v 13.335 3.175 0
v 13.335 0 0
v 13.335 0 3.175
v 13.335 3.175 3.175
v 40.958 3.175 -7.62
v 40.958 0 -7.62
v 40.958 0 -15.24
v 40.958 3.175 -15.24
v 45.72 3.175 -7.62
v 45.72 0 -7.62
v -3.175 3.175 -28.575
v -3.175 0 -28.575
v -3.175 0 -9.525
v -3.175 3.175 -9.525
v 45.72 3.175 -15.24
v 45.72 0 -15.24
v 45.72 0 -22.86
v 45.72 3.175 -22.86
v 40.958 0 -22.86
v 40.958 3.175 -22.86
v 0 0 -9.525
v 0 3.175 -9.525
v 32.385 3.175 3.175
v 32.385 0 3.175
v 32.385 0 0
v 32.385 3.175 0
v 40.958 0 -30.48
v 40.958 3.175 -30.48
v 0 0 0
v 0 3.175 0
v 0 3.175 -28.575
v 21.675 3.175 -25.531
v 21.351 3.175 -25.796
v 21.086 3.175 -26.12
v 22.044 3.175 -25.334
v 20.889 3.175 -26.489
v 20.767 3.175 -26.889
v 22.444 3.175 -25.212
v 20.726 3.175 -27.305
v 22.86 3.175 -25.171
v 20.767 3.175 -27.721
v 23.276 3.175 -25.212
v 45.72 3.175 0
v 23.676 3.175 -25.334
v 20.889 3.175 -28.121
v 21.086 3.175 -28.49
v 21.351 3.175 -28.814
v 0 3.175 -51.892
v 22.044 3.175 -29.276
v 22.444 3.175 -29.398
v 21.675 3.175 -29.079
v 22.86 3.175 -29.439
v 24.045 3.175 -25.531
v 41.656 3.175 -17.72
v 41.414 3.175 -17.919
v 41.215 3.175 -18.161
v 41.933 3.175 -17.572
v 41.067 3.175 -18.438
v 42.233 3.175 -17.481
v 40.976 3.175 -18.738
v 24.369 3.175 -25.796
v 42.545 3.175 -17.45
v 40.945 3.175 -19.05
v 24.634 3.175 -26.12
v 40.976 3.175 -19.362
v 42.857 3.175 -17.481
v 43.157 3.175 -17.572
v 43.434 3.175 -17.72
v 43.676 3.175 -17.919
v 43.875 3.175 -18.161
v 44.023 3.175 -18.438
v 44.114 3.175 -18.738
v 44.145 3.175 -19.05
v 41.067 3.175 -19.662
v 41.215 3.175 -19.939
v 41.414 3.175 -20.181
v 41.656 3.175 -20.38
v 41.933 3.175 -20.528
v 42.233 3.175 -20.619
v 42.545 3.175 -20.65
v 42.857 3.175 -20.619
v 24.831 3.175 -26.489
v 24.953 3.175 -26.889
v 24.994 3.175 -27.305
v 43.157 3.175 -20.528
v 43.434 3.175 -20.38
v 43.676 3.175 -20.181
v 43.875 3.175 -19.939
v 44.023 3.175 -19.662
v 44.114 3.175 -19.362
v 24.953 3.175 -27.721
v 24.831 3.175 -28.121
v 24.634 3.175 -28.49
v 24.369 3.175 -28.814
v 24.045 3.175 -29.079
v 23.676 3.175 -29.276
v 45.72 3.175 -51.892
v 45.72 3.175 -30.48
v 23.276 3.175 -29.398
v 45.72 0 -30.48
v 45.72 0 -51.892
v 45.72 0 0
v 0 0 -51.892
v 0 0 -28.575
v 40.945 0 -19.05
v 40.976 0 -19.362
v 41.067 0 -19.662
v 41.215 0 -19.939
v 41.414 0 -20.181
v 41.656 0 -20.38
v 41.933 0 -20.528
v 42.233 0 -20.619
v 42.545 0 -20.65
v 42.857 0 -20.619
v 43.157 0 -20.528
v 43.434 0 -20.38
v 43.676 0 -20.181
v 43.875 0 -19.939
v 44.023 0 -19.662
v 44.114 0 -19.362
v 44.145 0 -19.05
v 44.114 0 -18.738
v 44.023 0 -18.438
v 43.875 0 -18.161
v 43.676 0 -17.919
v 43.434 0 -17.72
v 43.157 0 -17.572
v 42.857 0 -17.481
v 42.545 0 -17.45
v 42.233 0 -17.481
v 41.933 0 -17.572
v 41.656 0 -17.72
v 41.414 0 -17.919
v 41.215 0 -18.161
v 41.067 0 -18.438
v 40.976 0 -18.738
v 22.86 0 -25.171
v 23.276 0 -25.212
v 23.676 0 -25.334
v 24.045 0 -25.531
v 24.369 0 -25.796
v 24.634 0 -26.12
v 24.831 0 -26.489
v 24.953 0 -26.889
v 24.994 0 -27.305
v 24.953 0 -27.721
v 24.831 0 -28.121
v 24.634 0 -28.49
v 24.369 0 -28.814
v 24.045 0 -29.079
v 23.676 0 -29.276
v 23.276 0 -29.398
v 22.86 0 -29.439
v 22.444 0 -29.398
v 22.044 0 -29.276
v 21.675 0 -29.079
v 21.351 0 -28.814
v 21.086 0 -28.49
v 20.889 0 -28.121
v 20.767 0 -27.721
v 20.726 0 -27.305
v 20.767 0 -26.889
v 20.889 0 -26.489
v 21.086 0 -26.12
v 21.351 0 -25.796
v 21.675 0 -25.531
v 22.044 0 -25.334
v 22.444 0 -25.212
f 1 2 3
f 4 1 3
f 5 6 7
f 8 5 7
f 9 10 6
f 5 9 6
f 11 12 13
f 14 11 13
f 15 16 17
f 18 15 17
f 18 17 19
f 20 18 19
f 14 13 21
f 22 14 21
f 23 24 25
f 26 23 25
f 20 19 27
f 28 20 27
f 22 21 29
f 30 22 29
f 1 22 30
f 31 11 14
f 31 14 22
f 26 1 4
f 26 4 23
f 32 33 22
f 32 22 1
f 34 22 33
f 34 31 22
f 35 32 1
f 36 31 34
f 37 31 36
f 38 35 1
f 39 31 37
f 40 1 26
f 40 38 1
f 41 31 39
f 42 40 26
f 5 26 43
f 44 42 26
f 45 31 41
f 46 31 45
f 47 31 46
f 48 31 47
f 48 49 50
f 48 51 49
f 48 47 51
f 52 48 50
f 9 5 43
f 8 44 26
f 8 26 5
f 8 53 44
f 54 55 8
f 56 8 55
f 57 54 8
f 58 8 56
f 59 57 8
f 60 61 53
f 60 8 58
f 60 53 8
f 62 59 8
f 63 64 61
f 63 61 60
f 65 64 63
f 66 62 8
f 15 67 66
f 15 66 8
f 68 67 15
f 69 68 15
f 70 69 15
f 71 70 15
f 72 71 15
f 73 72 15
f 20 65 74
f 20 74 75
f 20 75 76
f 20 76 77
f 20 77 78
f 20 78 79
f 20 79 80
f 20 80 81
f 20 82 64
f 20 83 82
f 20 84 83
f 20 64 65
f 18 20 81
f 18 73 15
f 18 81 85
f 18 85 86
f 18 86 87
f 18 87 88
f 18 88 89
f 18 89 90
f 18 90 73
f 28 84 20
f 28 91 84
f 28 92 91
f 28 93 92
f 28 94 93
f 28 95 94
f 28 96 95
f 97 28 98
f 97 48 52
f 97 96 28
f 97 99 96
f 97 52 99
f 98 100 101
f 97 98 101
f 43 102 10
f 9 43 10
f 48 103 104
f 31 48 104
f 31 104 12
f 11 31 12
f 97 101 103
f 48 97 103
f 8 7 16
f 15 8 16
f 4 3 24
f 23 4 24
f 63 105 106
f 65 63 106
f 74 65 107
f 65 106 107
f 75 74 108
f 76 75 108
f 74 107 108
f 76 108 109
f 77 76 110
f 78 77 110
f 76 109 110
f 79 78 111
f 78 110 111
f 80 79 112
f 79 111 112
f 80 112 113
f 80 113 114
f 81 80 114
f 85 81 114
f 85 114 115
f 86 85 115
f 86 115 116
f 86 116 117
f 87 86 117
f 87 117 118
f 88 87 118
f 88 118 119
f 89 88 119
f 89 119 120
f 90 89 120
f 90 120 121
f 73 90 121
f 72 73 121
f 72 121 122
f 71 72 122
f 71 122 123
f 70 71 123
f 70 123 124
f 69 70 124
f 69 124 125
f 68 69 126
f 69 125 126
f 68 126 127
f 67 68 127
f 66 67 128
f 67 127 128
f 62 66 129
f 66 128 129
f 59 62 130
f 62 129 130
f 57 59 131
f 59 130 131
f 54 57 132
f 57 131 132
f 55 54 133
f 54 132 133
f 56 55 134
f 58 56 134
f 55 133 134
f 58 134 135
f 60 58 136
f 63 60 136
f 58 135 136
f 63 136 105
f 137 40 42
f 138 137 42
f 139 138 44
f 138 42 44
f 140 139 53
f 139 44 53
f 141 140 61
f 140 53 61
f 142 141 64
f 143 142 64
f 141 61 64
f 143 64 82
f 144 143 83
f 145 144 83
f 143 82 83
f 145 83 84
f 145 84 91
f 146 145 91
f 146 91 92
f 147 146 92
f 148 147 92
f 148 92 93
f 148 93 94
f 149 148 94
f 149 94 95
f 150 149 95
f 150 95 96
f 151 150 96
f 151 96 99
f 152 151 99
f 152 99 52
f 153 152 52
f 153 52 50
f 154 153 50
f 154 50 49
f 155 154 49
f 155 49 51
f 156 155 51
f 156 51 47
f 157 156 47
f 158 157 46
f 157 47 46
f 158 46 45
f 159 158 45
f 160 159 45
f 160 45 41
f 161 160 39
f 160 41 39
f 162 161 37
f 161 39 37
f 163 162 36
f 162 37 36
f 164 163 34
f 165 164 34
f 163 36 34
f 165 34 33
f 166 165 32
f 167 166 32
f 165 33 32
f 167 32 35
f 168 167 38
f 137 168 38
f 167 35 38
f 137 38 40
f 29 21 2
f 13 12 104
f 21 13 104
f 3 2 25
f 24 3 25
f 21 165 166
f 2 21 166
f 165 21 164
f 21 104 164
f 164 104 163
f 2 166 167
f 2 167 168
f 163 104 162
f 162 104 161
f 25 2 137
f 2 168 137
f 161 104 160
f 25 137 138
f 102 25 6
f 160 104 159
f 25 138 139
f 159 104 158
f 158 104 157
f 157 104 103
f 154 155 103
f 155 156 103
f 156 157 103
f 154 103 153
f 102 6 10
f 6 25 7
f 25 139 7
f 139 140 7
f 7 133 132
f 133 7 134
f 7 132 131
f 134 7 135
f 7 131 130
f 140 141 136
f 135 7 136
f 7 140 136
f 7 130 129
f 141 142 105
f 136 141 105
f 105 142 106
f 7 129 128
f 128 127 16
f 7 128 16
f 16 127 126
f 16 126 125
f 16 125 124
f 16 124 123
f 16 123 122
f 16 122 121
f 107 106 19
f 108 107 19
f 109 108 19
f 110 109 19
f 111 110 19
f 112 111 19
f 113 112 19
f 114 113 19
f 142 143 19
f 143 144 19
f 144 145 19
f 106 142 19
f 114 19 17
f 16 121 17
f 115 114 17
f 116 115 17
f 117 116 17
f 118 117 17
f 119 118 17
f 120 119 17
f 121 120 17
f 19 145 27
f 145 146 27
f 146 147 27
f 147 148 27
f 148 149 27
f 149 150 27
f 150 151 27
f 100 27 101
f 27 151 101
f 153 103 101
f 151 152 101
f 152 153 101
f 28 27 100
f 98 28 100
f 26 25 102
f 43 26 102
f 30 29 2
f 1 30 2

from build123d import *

# Parameters (mm, degrees)
BOSS_EXTRUDE1_DEPTH  = 3.175
M3_CLEARANCE_HOLE1_D = 3.2
SKETCH4_R            = 2.1336
CUT_EXTRUDE1_DEPTH   = 70.232936135


with BuildPart() as part:
    # Sketch1 → Boss-Extrude1 (new body)
    with BuildSketch(Plane(origin=(0, 0, 0), x_dir=(1, 0, 0), z_dir=(0, 1, 0))):
        Polygon((0, 0), (13.335, 0), (13.335, -3.175), (32.385, -3.175), (32.385, 0), (45.72, 0), (45.72, 7.62), (40.9575, 7.62), (40.9575, 15.24), (45.72, 15.24), (45.72, 22.86), (40.9575, 22.86), (40.9575, 30.48), (45.72, 30.48), (45.72, 51.8922), (0, 51.8922), (0, 28.575), (-3.175, 28.575), (-3.175, 9.525), (0, 9.525), align=None)
    extrude(amount=BOSS_EXTRUDE1_DEPTH)

    # M3 Clearance Hole1 (through all)
    with Locations(Plane(origin=(0, 3.175, 0), x_dir=(1, 0, 0), z_dir=(0, 1, 0))):
        with Locations((42.545, 19.05)):
            Hole(M3_CLEARANCE_HOLE1_D / 2)

    # Sketch4 → Cut-Extrude1 (cut, through all)
    with BuildSketch(Plane(origin=(0, 3.175, 0), x_dir=(1, 0, 0), z_dir=(0, 1, 0))):
        with Locations(Location((22.86, 27.305, 0), (0, 0, 270))):
            Circle(SKETCH4_R)
    extrude(amount=-CUT_EXTRUDE1_DEPTH, mode=Mode.SUBTRACT)


solid = part.part
